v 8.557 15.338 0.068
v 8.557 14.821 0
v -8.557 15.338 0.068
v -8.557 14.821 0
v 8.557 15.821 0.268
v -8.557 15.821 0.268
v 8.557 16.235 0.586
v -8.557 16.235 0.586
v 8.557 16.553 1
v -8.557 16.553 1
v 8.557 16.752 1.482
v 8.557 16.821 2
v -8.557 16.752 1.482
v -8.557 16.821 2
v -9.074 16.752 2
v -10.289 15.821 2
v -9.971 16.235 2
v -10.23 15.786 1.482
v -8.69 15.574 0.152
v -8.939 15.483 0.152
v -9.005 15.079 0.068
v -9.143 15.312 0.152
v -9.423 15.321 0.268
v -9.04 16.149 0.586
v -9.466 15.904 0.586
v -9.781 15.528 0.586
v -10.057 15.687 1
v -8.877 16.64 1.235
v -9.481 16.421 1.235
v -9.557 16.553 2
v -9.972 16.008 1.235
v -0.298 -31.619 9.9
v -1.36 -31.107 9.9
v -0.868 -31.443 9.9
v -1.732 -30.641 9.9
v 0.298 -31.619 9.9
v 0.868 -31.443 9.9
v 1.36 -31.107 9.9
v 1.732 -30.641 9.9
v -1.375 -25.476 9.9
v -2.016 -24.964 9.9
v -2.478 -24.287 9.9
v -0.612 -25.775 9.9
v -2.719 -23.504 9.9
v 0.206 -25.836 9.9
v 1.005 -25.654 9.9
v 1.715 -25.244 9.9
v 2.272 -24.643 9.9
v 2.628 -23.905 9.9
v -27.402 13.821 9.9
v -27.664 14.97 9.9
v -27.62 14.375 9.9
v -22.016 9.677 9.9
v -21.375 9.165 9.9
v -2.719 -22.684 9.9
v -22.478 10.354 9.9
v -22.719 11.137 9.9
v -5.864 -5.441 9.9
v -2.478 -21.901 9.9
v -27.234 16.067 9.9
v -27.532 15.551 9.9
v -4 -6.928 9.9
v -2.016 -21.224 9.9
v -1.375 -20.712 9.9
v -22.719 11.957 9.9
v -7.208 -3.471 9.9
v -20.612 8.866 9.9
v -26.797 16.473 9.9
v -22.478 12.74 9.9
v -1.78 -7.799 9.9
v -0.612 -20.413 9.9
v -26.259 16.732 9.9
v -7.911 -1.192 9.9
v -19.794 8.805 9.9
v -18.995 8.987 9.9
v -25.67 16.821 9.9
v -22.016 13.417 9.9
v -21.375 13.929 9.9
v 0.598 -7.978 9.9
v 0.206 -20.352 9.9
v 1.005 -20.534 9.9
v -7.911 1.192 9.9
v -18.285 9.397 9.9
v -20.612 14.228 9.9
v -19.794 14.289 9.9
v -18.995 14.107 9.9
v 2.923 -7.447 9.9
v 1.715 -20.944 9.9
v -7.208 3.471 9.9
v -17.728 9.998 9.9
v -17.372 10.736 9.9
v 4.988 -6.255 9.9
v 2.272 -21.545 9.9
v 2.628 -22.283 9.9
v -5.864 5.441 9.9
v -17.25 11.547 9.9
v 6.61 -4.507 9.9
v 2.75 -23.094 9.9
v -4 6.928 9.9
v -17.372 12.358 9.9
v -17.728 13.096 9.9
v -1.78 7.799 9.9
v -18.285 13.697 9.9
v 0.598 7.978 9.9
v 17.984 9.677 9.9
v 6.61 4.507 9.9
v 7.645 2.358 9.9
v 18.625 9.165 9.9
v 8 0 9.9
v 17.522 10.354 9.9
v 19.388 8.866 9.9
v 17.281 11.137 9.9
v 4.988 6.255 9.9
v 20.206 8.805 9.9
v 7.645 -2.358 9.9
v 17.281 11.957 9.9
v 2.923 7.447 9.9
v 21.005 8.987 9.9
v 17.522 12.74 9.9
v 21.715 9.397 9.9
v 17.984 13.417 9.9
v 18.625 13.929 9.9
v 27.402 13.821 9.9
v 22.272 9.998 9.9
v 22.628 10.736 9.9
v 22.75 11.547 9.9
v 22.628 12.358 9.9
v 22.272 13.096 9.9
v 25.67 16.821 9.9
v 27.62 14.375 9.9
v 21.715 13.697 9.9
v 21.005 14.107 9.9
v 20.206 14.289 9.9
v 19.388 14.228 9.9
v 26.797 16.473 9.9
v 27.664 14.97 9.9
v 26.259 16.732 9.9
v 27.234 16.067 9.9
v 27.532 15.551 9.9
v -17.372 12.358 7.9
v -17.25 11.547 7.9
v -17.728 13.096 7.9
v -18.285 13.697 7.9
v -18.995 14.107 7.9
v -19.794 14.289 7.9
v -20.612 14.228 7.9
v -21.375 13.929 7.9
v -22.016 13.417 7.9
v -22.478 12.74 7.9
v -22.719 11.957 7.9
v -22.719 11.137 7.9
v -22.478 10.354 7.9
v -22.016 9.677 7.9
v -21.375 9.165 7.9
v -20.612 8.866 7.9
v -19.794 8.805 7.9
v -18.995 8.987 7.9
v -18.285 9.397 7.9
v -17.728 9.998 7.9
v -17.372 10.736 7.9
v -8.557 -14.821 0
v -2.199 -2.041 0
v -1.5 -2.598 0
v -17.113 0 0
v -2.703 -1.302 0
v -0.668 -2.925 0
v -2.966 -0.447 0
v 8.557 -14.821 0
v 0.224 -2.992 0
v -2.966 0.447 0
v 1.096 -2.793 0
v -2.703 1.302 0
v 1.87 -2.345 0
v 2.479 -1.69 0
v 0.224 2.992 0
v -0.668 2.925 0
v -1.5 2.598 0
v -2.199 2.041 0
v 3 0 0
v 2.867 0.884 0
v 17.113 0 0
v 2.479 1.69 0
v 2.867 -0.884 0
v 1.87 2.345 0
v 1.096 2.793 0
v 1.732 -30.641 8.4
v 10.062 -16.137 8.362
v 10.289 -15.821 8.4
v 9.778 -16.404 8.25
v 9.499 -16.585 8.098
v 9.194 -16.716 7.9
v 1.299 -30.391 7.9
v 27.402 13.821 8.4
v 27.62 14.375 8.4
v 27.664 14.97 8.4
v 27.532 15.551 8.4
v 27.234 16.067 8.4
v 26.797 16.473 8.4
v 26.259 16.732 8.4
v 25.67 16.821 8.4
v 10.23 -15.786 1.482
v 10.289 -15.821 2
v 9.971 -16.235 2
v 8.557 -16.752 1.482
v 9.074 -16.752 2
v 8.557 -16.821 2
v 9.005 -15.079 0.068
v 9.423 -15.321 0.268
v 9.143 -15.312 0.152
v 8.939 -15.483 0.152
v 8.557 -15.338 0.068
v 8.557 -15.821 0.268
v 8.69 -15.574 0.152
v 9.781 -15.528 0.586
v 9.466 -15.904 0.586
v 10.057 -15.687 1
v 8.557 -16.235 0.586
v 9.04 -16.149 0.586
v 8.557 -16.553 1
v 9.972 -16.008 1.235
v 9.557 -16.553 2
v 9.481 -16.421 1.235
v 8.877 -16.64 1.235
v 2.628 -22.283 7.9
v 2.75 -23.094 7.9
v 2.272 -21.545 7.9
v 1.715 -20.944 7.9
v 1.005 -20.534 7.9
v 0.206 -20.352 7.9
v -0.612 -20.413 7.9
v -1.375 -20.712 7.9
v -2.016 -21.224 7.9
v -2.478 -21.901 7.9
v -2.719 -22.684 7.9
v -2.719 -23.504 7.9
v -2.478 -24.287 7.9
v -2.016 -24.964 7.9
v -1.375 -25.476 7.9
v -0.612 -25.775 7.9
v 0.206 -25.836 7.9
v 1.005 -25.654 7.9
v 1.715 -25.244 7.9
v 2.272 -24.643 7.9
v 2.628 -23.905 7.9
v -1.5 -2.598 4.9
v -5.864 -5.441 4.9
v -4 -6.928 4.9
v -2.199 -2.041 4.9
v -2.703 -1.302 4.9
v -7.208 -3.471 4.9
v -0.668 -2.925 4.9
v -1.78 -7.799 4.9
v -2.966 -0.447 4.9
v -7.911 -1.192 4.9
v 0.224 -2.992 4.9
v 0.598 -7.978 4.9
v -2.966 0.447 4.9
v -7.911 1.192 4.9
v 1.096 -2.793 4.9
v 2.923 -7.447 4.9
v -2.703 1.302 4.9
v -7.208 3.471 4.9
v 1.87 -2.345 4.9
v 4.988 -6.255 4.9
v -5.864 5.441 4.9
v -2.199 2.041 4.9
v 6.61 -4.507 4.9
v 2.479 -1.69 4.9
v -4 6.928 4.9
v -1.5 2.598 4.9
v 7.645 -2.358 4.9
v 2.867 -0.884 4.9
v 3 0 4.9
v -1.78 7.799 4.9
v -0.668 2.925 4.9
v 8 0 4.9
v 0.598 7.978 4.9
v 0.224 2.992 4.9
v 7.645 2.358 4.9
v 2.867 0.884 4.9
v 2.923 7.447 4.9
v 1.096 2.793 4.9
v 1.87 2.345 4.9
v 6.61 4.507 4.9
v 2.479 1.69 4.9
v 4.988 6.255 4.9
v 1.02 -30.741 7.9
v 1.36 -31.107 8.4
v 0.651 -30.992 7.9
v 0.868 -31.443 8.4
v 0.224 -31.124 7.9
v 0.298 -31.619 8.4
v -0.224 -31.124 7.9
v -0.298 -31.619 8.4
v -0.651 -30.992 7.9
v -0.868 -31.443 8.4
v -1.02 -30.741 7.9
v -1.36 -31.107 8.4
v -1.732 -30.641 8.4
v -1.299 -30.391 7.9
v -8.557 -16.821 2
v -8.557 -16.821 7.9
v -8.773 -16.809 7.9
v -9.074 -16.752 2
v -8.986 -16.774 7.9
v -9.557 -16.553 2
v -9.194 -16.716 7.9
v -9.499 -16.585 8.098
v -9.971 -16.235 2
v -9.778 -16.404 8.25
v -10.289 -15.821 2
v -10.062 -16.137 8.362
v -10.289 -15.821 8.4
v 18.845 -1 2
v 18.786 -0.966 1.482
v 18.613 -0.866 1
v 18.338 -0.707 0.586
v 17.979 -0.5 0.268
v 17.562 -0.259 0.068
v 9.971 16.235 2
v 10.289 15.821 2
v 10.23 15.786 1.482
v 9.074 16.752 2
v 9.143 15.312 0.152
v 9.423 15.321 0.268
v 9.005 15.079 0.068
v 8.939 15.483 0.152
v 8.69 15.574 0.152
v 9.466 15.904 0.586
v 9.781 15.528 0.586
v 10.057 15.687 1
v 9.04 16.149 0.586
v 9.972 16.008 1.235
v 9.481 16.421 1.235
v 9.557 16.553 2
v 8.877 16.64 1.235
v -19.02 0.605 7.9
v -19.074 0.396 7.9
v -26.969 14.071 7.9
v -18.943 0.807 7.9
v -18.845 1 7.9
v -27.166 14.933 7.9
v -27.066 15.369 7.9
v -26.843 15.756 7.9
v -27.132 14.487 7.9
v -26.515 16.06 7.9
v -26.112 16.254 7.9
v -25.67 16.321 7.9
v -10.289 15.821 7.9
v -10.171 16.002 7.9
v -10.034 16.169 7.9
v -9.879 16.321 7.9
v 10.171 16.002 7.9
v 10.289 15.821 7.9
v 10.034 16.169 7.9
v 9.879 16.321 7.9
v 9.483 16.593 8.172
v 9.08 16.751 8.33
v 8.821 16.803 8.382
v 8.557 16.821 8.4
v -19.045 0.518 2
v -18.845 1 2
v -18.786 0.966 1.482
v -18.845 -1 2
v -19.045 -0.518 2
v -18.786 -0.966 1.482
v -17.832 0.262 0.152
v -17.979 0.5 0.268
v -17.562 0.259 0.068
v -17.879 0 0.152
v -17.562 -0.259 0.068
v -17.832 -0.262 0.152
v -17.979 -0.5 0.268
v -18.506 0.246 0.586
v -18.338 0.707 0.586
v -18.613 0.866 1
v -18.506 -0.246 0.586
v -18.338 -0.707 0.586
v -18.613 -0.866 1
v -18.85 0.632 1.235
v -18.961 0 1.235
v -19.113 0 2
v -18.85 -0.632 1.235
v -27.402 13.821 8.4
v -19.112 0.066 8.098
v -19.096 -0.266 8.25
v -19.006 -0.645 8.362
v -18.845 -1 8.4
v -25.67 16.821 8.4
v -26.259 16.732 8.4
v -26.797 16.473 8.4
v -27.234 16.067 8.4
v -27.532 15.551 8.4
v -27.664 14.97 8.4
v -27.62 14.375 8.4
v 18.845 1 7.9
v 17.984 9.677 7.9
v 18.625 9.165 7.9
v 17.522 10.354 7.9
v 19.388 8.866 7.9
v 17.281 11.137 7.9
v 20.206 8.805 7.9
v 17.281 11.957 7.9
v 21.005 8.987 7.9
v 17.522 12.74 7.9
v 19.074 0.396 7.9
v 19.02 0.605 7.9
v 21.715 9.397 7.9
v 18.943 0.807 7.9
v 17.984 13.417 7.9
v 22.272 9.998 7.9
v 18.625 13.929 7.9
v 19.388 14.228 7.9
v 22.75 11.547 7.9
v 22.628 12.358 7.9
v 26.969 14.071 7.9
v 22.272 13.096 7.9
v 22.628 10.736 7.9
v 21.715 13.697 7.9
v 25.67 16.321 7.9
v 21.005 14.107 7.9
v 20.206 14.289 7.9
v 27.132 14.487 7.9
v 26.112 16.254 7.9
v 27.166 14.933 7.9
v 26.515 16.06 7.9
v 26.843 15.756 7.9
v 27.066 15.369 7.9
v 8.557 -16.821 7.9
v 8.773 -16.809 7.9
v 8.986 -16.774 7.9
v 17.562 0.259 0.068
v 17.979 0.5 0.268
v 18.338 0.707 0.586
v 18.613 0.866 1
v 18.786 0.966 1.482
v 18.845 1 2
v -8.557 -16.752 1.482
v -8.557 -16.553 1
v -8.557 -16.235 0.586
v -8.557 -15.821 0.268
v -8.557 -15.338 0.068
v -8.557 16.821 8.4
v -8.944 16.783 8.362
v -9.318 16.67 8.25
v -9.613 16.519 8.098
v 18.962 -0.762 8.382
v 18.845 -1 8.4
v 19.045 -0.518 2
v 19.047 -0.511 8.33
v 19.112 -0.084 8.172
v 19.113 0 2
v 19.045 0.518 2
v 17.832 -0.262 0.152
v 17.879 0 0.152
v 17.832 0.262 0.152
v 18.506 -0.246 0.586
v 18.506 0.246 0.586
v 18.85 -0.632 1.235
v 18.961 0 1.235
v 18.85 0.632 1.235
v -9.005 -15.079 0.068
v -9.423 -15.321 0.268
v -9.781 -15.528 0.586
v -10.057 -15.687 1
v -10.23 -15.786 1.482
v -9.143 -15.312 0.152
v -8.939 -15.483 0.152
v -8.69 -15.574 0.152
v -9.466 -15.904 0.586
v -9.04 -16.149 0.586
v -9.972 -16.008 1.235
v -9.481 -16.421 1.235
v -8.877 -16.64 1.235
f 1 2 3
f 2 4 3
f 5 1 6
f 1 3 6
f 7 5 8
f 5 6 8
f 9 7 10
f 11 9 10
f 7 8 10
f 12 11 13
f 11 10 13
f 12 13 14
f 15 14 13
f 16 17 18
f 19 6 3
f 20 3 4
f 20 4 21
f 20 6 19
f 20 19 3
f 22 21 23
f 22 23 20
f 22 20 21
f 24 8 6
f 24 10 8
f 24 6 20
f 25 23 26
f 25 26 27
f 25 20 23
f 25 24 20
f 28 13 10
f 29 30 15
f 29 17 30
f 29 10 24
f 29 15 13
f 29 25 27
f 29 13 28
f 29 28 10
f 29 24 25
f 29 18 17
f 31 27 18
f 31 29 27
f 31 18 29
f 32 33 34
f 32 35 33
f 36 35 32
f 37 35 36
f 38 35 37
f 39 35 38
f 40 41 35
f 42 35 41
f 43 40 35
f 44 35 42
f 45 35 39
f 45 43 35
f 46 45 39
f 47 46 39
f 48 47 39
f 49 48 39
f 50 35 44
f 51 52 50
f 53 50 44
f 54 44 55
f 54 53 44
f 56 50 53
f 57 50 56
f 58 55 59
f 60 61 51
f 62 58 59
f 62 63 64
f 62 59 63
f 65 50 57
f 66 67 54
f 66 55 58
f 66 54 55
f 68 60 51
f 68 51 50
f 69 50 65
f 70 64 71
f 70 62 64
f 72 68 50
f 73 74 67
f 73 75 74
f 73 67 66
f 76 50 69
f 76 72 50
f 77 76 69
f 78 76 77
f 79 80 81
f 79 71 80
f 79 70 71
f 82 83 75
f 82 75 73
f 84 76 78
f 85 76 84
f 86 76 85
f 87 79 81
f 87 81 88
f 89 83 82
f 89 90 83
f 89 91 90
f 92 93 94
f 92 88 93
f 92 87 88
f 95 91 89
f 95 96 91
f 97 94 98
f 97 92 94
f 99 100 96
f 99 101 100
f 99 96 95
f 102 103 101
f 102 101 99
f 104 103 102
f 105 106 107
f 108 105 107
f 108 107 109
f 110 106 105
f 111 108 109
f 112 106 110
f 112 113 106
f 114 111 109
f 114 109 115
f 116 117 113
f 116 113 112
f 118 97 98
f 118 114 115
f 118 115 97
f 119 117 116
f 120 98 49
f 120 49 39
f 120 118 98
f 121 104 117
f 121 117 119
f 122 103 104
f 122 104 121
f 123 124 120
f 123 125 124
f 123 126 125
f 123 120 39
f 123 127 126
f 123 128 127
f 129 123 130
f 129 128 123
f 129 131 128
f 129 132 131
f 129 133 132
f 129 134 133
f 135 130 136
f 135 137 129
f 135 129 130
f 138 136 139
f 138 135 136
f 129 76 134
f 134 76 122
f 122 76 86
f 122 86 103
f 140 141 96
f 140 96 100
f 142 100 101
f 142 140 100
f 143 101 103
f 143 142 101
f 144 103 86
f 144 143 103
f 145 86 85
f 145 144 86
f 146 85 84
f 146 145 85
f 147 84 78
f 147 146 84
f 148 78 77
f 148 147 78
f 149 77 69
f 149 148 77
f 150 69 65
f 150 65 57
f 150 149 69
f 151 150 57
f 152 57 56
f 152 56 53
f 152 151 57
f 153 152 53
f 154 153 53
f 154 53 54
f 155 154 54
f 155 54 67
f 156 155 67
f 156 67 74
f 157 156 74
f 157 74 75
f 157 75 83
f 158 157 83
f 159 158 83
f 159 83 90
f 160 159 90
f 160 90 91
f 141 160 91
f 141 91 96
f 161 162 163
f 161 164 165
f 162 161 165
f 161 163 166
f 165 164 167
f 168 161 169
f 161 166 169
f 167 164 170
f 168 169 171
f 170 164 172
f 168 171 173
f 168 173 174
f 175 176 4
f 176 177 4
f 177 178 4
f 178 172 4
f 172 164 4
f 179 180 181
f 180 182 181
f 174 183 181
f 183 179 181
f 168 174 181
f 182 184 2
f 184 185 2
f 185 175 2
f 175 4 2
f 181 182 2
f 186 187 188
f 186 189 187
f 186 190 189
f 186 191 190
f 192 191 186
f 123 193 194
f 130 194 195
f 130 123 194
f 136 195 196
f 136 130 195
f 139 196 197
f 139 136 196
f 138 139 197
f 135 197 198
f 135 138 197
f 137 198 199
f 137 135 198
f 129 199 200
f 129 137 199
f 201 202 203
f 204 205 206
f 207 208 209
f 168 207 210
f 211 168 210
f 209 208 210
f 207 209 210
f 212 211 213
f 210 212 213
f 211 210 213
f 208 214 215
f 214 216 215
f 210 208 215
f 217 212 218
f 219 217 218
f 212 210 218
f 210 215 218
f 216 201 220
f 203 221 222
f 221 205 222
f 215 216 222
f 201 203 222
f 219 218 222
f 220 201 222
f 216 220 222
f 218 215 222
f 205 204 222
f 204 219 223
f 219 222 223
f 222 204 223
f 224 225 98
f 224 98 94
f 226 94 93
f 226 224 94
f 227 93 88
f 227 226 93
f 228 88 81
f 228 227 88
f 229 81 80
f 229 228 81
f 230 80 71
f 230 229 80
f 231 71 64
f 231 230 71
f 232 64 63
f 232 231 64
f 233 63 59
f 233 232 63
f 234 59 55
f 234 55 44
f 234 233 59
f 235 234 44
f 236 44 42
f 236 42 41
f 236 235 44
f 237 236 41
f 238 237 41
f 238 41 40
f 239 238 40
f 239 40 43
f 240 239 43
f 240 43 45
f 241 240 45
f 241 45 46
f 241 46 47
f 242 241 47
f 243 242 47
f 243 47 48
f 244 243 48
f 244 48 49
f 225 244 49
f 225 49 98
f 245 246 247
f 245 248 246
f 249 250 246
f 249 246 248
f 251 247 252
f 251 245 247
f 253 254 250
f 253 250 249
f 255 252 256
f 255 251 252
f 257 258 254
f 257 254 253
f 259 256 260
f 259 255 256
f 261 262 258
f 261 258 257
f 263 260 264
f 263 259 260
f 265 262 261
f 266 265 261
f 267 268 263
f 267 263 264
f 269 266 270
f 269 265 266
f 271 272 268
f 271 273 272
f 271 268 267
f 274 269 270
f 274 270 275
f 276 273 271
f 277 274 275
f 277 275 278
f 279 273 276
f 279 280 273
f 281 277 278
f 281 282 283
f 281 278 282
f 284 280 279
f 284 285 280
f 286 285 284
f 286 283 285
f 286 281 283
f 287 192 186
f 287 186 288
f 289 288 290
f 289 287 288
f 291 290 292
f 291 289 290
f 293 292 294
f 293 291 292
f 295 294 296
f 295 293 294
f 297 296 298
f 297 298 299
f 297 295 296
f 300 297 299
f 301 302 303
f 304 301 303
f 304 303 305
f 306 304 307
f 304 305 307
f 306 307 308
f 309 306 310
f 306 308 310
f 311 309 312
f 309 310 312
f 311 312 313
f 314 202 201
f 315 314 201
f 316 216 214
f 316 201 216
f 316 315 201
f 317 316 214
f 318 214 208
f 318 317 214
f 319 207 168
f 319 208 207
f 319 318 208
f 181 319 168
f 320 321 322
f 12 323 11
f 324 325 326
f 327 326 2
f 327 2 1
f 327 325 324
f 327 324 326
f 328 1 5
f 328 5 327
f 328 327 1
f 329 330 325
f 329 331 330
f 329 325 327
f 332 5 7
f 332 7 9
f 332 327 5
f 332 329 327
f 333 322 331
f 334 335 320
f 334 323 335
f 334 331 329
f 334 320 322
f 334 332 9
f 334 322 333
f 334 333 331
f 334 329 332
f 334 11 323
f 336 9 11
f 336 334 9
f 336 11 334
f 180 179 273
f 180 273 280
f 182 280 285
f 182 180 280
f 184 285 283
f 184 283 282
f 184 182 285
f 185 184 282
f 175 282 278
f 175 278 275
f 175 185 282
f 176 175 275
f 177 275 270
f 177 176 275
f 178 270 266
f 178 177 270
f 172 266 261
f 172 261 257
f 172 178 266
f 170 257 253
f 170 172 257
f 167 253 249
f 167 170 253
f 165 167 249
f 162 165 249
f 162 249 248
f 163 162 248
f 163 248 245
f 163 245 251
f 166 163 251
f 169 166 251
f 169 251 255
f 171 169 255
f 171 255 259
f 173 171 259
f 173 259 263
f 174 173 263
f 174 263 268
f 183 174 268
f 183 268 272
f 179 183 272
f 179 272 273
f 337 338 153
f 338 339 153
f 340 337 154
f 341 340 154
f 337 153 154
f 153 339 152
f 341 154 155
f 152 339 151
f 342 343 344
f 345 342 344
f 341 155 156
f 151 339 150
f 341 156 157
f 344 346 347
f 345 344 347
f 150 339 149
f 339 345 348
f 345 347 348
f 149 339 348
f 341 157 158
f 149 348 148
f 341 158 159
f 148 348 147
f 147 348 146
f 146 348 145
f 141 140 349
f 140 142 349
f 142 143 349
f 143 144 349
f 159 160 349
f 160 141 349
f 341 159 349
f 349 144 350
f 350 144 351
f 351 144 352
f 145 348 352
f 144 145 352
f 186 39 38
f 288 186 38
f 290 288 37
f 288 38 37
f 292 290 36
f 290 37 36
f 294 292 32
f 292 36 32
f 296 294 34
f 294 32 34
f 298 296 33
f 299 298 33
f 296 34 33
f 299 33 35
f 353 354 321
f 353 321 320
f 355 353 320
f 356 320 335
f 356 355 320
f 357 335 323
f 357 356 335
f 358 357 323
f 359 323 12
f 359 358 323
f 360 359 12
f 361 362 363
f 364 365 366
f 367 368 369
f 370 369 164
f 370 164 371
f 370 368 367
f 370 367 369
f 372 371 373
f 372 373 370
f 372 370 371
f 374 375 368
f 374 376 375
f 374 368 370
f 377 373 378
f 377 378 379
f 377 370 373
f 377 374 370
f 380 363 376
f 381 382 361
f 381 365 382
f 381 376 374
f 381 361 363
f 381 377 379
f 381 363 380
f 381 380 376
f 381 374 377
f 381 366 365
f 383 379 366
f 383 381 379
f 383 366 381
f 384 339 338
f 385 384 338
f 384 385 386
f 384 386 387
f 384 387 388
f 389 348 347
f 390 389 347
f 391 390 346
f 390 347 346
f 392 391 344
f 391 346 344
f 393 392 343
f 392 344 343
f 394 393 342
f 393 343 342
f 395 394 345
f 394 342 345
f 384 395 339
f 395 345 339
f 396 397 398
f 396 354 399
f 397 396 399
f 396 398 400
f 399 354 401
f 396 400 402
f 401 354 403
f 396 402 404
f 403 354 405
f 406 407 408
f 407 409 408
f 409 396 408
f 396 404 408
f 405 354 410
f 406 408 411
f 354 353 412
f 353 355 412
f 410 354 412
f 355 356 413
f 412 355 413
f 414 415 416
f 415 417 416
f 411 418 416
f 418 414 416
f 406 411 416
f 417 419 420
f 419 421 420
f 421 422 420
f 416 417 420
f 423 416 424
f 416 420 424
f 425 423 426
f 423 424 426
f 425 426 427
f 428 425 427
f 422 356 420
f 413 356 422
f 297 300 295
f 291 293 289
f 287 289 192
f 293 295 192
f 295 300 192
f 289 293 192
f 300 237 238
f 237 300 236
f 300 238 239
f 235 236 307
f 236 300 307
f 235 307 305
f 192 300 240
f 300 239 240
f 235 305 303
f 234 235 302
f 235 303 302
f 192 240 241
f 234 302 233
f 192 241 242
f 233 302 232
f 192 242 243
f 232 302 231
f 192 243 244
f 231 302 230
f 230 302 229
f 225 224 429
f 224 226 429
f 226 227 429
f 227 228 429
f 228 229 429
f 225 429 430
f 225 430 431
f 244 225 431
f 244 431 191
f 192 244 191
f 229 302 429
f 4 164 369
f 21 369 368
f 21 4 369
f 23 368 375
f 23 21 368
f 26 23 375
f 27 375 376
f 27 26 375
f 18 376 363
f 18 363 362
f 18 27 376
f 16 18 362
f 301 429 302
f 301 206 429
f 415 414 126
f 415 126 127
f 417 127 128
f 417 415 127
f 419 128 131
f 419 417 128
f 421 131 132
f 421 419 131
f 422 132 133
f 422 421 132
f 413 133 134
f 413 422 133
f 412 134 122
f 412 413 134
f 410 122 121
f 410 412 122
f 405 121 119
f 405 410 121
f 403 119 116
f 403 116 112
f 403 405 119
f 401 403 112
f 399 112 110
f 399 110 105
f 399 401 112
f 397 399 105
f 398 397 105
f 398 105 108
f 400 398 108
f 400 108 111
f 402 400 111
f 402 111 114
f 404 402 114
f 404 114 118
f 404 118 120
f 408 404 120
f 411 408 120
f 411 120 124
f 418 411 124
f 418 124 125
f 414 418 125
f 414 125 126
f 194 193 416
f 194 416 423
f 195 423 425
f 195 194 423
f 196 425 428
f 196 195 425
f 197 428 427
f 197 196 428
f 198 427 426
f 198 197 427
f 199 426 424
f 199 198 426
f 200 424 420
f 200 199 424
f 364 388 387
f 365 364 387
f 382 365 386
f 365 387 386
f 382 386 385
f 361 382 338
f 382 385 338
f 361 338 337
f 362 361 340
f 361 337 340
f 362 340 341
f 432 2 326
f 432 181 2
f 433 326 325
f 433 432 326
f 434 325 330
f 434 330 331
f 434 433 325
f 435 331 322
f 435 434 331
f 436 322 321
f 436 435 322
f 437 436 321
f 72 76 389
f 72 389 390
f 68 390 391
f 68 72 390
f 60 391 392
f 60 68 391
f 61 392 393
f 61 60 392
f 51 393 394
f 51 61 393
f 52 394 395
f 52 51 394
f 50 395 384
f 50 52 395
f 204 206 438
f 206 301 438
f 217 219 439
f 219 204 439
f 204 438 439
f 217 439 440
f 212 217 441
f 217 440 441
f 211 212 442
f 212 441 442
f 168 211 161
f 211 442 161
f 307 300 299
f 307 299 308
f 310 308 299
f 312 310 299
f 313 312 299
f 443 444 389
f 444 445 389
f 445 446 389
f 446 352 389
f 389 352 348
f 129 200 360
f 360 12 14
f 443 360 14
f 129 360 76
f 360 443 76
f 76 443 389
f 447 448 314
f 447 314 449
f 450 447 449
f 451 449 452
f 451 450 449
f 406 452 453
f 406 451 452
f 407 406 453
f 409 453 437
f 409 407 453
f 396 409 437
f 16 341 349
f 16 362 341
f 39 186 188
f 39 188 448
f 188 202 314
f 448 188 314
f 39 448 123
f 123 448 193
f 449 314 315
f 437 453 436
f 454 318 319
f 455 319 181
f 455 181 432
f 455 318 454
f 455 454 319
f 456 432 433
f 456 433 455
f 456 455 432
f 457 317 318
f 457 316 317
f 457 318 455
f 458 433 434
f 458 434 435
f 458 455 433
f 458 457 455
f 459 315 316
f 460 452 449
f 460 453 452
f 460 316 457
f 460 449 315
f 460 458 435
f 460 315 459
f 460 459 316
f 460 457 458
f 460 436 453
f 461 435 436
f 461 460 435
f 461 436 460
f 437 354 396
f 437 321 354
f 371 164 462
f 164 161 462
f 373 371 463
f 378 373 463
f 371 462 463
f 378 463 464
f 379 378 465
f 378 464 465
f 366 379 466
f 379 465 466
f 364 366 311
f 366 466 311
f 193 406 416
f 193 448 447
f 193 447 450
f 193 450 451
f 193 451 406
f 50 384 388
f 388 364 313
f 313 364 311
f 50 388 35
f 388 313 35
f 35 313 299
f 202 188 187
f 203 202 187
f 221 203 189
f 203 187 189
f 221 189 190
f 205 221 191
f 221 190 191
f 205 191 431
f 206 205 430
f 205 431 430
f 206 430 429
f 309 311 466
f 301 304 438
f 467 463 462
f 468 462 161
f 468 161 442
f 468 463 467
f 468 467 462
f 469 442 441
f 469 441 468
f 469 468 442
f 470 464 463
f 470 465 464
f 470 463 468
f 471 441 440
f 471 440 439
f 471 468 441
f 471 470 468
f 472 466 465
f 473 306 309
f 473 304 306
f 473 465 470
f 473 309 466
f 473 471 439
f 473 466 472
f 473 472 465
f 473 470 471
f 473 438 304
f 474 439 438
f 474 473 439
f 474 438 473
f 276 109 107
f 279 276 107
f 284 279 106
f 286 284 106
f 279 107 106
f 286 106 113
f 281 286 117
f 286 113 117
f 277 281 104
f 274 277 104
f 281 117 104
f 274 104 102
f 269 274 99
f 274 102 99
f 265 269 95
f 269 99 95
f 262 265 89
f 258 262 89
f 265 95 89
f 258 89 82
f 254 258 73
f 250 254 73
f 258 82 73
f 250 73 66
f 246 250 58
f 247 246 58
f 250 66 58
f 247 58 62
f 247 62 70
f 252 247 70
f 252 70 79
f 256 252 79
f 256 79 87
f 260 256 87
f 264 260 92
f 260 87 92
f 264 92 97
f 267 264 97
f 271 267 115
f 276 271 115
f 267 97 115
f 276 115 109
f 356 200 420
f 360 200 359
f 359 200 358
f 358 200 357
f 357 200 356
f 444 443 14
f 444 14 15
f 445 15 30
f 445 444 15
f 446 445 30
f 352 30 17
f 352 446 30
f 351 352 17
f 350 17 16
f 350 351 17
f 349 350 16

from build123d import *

# Parameters (mm, degrees)
F0_R     = 2.75
F0_R_2   = 3
F1_DEPTH = 9.9
F2_DEPTH = 7.9
F3_R     = 8
F3_R_2   = 3
F4_DEPTH = 5
F5_R     = 2
F6_SIZE  = 0.5


with BuildPart() as f1:
    # F0 (on Top) → F1 (new body)
    with BuildSketch(Plane.XY):
        Polygon((-9.7113248654, -16.8205080757), (0, -33.6410161514), (9.7113248654, -16.8205080757), align=None)
        with Locations((0, -23.0940107676)):
            Circle(F0_R, mode=Mode.SUBTRACT)
        Polygon((-19.4226497308, 0), (-9.7113248654, -16.8205080757), (9.7113248654, -16.8205080757), (19.4226497308, 0), (9.7113248654, 16.8205080757), (-9.7113248654, 16.8205080757), align=None)
        Circle(F0_R_2, mode=Mode.SUBTRACT)
        Polygon((-29.1339745962, 16.8205080757), (-19.4226497308, 0), (-9.7113248654, 16.8205080757), align=None)
        with Locations((-20, 11.5470053838)):
            Circle(F0_R, mode=Mode.SUBTRACT)
        Polygon((9.7113248654, 16.8205080757), (19.4226497308, 0), (29.1339745962, 16.8205080757), align=None)
        with Locations((20, 11.5470053838)):
            Circle(F0_R, mode=Mode.SUBTRACT)
    extrude(amount=F1_DEPTH)

    # F0 (on Top) → F2 (cut)
    with BuildSketch(Plane.XY):
        Polygon((9.7113248654, 16.8205080757), (19.4226497308, 0), (29.1339745962, 16.8205080757), align=None)
        with Locations((20, 11.5470053838)):
            Circle(F0_R, mode=Mode.SUBTRACT)
        Polygon((-9.7113248654, -16.8205080757), (0, -33.6410161514), (9.7113248654, -16.8205080757), align=None)
        with Locations((0, -23.0940107676)):
            Circle(F0_R, mode=Mode.SUBTRACT)
        Polygon((-29.1339745962, 16.8205080757), (-19.4226497308, 0), (-9.7113248654, 16.8205080757), align=None)
        with Locations((-20, 11.5470053838)):
            Circle(F0_R, mode=Mode.SUBTRACT)
    extrude(amount=F2_DEPTH, mode=Mode.SUBTRACT)

    # F3 (on face) → F4 (cut)
    with BuildSketch(Plane.XY.offset(9.9)):
        Circle(F3_R)
        Circle(F3_R_2, mode=Mode.SUBTRACT)
    extrude(amount=-F4_DEPTH, mode=Mode.SUBTRACT)

    # F5
    f5_edges = [f1.edges().sort_by_distance(p)[0] for p in [
        (-29.133975, 16.820508, 8.9),
        (-9.711325, 16.820508, 3.95),
        (-19.42265, 0, 3.95),
        (9.711325, 16.820508, 3.95),
        (14.566987, 8.410254, 0),
        (0, 16.820508, 0),
        (-14.566987, 8.410254, 0),
        (-14.566987, -8.410254, 0),
        (0, -16.820508, 0),
        (19.42265, 0, 3.95),
        (9.711325, -16.820508, 3.95),
        (0, -33.641016, 8.9),
        (29.133975, 16.820508, 8.9),
        (-9.711325, -16.820508, 3.95),
        (14.566987, -8.410254, 0),
    ]]
    fillet(f5_edges, radius=F5_R)

    # F6
    f6_edges = [f1.edges().sort_by_distance(p)[0] for p in [
        (0, -31.641016, 7.9),
        (-27.401924, 15.820508, 7.9),
        (27.401924, 15.820508, 7.9),
    ]]
    chamfer(f6_edges, length=F6_SIZE)


solid = f1.part
